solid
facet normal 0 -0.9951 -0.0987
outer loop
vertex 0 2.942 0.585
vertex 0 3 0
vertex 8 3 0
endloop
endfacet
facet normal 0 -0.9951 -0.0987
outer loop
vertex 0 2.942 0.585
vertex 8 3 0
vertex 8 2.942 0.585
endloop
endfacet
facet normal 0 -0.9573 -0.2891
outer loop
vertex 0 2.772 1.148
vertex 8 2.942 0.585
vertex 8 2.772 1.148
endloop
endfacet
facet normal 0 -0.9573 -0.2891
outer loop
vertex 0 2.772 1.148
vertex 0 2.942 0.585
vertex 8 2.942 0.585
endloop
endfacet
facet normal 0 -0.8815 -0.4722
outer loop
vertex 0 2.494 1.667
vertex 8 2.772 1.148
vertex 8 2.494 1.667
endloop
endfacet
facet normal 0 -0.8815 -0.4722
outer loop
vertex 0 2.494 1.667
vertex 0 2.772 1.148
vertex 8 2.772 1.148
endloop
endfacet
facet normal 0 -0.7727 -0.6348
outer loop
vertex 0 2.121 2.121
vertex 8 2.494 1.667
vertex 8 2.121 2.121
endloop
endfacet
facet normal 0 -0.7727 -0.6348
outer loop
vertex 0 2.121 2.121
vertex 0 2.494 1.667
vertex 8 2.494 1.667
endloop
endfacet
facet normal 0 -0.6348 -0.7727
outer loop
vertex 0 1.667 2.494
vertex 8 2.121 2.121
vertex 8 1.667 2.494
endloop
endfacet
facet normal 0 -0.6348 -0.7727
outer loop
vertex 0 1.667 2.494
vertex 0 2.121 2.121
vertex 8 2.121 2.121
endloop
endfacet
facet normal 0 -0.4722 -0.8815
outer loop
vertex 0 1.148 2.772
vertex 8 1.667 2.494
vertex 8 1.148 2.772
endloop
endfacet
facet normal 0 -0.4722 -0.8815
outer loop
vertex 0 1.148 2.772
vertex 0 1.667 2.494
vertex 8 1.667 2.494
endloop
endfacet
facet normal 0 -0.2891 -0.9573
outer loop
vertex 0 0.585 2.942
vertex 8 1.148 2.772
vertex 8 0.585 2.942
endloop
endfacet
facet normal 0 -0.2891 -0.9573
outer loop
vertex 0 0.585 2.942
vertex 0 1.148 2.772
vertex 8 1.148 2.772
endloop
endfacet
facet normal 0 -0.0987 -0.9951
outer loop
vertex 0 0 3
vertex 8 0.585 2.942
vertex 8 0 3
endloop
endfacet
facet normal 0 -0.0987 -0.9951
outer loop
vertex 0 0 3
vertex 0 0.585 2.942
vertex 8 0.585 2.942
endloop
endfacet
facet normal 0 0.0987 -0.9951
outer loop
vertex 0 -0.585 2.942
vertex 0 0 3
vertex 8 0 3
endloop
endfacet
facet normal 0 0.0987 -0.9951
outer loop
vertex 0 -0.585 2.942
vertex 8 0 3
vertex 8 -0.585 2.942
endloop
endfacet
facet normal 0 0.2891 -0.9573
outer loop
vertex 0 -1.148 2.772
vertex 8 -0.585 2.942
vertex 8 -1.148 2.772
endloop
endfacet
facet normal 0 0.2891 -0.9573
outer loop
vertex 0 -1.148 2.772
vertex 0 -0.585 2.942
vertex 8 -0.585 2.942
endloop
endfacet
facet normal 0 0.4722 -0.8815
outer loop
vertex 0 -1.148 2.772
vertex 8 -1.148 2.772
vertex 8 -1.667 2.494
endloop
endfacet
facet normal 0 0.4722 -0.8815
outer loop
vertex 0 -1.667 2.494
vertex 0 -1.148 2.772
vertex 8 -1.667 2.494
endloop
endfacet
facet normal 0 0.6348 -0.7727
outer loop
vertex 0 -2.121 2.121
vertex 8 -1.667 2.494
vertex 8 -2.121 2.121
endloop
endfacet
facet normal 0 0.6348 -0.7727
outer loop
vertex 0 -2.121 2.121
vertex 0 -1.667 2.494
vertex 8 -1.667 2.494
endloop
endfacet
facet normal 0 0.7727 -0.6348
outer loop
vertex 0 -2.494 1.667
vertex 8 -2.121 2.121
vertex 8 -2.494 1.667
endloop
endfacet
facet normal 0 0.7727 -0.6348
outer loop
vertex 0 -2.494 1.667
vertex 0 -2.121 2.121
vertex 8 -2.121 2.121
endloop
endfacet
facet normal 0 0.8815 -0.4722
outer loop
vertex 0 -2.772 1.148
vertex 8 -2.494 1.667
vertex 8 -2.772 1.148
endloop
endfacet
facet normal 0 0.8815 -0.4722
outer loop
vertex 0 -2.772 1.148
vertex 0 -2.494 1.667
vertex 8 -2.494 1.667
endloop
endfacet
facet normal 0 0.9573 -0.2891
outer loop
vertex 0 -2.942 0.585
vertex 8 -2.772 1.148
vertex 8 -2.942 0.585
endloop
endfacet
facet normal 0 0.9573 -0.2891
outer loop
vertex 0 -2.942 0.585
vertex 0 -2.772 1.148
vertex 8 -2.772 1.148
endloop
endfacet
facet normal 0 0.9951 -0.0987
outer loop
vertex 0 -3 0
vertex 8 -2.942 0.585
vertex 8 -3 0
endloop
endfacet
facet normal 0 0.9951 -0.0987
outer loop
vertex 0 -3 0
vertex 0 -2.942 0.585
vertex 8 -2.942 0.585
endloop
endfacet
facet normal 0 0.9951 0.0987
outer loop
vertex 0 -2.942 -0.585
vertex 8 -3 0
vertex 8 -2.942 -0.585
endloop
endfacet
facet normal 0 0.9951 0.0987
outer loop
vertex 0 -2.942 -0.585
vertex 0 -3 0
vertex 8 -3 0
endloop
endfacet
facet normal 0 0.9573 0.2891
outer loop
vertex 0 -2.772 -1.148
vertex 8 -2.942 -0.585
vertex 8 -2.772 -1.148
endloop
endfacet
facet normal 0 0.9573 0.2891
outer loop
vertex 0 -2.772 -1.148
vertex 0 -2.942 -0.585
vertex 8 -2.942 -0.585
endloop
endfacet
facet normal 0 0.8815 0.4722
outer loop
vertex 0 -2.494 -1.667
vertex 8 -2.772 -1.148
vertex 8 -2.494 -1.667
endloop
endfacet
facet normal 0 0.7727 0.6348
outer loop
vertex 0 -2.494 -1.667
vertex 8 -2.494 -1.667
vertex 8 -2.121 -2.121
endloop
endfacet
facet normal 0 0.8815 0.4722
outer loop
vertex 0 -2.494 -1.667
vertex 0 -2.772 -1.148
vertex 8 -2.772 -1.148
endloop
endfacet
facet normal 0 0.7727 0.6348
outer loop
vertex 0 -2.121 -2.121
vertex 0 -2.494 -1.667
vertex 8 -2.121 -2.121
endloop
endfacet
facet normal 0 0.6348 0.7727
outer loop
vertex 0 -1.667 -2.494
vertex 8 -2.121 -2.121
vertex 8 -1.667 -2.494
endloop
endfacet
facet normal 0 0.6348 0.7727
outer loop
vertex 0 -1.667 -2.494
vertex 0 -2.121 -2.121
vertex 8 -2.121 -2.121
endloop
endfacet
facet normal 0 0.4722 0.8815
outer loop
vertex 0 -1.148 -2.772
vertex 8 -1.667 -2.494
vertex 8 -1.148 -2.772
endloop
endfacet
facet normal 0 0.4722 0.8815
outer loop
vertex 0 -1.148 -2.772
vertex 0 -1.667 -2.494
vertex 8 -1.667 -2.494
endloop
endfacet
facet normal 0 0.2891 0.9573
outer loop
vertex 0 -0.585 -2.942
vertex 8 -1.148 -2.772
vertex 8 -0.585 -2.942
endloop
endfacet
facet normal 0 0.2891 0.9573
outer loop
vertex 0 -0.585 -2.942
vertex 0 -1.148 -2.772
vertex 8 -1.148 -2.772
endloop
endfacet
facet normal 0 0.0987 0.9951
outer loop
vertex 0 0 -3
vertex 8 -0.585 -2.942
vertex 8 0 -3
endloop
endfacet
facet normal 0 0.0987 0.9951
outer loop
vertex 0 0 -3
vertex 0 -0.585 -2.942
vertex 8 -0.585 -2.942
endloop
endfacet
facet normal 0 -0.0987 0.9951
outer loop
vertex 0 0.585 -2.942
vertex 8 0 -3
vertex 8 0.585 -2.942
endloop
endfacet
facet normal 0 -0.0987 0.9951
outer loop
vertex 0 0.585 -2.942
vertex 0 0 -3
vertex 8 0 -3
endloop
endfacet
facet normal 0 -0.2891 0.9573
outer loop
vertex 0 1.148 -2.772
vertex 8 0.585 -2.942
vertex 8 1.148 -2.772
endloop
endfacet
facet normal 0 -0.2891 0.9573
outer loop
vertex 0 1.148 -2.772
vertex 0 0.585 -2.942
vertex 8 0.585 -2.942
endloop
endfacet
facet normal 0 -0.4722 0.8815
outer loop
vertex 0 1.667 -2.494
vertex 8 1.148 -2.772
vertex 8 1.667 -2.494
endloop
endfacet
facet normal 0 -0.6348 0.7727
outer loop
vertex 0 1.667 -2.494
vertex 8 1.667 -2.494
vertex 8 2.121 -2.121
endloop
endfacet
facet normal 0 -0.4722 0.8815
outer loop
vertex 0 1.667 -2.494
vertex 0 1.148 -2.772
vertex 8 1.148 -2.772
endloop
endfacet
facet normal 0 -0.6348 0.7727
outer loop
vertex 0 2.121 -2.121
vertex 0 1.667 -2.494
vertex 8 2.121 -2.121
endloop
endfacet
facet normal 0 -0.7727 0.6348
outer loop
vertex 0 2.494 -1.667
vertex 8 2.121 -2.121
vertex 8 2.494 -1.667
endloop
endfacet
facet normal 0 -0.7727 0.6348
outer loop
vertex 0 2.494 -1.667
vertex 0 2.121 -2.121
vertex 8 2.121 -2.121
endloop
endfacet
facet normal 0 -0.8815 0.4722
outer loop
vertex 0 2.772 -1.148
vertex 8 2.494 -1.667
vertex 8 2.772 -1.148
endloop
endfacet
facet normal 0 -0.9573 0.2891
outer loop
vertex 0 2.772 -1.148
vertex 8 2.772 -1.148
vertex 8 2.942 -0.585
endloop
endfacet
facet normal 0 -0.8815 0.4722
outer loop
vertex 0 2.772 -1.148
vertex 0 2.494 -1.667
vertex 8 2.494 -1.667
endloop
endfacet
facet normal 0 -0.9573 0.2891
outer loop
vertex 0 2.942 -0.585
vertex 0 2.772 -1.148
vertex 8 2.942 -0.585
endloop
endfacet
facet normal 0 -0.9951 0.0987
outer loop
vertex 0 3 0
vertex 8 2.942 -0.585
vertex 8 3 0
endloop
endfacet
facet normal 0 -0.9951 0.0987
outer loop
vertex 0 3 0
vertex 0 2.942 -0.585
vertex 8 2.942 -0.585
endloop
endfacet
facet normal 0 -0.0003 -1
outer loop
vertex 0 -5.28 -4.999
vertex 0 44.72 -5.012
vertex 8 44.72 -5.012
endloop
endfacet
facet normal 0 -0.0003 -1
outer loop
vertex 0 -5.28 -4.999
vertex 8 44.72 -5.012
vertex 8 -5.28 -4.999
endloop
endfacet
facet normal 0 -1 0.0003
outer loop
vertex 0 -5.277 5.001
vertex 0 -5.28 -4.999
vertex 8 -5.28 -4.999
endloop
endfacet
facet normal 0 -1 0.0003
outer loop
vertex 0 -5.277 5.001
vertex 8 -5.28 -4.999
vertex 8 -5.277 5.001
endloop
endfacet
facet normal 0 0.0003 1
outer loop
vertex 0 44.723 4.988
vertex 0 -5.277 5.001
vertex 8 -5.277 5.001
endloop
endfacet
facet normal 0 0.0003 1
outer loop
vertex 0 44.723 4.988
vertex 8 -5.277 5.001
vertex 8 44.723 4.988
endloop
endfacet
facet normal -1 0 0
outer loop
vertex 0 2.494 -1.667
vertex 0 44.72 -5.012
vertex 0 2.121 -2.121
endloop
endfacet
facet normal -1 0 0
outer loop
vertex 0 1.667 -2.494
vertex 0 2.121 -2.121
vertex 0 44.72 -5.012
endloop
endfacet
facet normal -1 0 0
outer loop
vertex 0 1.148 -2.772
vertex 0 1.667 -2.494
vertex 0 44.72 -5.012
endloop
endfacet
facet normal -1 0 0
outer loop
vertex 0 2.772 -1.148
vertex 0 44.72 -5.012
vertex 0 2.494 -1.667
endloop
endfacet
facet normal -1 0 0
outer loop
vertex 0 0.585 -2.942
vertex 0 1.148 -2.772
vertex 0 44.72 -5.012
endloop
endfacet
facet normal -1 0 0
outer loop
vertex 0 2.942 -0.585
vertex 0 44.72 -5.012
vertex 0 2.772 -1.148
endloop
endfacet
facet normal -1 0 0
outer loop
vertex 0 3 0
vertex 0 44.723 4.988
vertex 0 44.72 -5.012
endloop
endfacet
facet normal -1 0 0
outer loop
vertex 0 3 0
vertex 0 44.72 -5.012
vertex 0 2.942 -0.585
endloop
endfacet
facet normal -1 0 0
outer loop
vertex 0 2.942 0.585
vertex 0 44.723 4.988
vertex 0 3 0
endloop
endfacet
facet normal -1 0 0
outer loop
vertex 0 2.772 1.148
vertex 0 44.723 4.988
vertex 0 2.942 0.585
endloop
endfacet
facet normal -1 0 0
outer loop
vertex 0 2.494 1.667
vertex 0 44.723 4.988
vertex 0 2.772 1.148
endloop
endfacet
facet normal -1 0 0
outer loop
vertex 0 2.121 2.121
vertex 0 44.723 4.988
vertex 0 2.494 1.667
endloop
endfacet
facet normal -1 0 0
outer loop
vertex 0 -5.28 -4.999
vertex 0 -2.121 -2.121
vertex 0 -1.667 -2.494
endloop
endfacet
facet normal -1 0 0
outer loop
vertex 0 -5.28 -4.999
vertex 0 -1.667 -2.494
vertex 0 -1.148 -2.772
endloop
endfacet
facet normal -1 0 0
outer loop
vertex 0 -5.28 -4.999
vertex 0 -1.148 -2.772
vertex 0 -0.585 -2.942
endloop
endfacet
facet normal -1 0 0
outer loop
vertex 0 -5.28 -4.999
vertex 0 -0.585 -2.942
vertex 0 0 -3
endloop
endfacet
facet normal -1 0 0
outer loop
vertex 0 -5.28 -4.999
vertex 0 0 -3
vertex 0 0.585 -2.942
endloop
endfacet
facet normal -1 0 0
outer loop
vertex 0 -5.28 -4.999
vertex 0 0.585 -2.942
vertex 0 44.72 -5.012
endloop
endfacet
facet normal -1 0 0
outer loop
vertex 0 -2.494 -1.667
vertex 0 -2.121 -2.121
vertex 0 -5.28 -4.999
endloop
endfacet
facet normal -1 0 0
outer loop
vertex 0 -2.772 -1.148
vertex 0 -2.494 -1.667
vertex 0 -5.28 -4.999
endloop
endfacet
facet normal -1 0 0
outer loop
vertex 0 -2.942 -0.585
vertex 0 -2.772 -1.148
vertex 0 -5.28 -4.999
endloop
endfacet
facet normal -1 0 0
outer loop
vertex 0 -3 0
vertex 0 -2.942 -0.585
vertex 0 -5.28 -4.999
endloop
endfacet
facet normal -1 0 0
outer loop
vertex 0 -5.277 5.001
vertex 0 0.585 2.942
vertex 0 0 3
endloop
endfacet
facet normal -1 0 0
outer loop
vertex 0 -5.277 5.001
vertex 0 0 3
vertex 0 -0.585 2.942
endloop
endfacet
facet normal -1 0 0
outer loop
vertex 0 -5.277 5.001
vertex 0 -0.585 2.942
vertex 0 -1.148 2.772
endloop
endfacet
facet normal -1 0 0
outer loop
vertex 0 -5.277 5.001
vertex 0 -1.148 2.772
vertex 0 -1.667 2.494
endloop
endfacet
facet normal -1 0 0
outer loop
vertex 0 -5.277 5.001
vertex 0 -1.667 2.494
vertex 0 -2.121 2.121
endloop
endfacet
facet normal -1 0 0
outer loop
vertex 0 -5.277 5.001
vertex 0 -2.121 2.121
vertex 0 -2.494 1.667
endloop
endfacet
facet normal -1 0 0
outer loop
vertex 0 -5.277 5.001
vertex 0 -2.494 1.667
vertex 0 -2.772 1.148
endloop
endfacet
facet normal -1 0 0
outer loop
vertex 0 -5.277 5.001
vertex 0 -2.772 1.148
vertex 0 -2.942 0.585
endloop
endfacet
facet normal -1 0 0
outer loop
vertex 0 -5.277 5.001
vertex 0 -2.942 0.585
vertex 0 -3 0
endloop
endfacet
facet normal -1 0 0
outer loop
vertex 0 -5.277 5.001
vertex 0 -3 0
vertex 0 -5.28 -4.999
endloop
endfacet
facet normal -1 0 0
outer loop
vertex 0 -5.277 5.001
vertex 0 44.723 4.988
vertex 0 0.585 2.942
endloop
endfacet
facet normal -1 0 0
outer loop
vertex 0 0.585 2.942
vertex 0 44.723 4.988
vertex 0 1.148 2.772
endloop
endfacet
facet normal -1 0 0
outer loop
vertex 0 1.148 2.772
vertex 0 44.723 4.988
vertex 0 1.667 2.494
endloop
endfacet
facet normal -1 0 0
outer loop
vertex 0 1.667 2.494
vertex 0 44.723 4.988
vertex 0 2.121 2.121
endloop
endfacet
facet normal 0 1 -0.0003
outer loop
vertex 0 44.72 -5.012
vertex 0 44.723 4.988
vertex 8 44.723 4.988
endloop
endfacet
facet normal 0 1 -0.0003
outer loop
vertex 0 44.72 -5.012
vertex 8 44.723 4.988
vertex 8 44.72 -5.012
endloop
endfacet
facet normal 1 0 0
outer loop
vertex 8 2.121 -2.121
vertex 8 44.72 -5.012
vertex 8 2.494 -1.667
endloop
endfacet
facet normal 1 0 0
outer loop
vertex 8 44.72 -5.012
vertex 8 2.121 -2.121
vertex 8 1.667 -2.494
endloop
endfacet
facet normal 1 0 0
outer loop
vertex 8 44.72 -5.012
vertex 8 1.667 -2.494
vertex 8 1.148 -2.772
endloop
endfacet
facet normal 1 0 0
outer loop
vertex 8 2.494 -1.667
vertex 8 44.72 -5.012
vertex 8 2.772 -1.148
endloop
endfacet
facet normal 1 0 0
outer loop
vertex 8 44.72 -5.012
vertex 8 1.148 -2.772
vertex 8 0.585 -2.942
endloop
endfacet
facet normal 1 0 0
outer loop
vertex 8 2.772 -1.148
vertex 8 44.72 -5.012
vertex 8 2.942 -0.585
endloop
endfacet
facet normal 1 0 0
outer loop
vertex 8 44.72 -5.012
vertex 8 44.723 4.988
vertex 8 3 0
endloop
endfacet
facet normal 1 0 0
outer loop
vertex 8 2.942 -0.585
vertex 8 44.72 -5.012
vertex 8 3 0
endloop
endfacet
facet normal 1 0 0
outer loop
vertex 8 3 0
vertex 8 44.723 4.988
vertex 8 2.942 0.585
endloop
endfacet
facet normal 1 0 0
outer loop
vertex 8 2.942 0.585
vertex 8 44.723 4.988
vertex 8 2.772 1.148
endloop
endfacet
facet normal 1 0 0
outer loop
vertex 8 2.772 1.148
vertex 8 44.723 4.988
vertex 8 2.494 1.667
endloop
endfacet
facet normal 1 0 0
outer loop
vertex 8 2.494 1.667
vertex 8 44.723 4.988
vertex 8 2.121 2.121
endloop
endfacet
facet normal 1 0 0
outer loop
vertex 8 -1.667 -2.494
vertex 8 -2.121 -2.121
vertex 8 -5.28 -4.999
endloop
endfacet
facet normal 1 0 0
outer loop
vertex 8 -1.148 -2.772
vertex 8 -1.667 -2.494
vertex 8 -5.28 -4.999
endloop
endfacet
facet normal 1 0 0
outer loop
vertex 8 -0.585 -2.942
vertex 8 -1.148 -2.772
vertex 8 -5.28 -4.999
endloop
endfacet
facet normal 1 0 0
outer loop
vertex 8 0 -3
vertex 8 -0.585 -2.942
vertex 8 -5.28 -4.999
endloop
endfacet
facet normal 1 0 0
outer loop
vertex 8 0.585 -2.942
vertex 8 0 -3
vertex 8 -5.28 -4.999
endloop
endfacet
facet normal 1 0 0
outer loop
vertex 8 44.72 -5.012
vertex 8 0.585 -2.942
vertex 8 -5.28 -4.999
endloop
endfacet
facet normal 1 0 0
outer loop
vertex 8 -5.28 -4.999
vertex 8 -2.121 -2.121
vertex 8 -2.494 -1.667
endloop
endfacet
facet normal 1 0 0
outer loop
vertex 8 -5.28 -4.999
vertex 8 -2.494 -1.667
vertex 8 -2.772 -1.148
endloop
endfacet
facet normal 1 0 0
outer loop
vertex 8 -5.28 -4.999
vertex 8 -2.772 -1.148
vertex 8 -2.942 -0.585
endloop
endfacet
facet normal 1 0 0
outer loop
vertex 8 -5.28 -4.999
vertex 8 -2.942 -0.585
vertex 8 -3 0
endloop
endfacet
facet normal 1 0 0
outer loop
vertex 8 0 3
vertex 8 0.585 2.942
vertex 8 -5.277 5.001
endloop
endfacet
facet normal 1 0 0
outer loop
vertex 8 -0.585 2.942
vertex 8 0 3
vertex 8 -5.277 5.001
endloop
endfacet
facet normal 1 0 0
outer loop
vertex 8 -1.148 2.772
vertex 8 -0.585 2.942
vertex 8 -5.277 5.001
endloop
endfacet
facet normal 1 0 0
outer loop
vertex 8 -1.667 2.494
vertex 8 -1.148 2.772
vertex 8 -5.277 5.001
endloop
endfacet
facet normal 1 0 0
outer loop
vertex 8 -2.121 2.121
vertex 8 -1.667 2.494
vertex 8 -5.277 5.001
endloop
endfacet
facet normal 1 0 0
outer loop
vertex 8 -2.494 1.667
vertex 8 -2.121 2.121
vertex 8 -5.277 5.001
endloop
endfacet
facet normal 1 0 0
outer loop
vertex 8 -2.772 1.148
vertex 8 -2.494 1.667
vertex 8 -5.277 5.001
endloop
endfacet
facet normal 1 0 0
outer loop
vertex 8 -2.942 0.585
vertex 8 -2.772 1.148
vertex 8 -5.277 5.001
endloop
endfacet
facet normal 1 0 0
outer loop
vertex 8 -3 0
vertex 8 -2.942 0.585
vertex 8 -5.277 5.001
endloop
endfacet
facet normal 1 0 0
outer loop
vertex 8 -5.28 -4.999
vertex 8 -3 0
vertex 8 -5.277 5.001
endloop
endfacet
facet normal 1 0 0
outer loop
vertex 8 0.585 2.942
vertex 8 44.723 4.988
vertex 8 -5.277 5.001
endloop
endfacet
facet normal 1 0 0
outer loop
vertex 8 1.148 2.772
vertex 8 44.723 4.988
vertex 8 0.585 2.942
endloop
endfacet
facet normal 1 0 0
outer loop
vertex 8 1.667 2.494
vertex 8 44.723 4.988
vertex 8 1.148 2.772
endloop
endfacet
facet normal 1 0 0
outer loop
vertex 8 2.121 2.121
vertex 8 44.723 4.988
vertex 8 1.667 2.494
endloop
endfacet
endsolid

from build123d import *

# Parameters (mm, degrees)
SKETCH_R  = 3
PAD_DEPTH = 8


with BuildPart() as part:
    # Sketch → Pad (new body)
    with BuildSketch(Plane.YZ):
        Polygon((-5.277262, 5.001455), (44.722736, 4.987671), (44.719979, -5.012328), (-5.280019, -4.998545), align=None)
        Circle(SKETCH_R, mode=Mode.SUBTRACT)
    extrude(amount=PAD_DEPTH)


solid = part.part
